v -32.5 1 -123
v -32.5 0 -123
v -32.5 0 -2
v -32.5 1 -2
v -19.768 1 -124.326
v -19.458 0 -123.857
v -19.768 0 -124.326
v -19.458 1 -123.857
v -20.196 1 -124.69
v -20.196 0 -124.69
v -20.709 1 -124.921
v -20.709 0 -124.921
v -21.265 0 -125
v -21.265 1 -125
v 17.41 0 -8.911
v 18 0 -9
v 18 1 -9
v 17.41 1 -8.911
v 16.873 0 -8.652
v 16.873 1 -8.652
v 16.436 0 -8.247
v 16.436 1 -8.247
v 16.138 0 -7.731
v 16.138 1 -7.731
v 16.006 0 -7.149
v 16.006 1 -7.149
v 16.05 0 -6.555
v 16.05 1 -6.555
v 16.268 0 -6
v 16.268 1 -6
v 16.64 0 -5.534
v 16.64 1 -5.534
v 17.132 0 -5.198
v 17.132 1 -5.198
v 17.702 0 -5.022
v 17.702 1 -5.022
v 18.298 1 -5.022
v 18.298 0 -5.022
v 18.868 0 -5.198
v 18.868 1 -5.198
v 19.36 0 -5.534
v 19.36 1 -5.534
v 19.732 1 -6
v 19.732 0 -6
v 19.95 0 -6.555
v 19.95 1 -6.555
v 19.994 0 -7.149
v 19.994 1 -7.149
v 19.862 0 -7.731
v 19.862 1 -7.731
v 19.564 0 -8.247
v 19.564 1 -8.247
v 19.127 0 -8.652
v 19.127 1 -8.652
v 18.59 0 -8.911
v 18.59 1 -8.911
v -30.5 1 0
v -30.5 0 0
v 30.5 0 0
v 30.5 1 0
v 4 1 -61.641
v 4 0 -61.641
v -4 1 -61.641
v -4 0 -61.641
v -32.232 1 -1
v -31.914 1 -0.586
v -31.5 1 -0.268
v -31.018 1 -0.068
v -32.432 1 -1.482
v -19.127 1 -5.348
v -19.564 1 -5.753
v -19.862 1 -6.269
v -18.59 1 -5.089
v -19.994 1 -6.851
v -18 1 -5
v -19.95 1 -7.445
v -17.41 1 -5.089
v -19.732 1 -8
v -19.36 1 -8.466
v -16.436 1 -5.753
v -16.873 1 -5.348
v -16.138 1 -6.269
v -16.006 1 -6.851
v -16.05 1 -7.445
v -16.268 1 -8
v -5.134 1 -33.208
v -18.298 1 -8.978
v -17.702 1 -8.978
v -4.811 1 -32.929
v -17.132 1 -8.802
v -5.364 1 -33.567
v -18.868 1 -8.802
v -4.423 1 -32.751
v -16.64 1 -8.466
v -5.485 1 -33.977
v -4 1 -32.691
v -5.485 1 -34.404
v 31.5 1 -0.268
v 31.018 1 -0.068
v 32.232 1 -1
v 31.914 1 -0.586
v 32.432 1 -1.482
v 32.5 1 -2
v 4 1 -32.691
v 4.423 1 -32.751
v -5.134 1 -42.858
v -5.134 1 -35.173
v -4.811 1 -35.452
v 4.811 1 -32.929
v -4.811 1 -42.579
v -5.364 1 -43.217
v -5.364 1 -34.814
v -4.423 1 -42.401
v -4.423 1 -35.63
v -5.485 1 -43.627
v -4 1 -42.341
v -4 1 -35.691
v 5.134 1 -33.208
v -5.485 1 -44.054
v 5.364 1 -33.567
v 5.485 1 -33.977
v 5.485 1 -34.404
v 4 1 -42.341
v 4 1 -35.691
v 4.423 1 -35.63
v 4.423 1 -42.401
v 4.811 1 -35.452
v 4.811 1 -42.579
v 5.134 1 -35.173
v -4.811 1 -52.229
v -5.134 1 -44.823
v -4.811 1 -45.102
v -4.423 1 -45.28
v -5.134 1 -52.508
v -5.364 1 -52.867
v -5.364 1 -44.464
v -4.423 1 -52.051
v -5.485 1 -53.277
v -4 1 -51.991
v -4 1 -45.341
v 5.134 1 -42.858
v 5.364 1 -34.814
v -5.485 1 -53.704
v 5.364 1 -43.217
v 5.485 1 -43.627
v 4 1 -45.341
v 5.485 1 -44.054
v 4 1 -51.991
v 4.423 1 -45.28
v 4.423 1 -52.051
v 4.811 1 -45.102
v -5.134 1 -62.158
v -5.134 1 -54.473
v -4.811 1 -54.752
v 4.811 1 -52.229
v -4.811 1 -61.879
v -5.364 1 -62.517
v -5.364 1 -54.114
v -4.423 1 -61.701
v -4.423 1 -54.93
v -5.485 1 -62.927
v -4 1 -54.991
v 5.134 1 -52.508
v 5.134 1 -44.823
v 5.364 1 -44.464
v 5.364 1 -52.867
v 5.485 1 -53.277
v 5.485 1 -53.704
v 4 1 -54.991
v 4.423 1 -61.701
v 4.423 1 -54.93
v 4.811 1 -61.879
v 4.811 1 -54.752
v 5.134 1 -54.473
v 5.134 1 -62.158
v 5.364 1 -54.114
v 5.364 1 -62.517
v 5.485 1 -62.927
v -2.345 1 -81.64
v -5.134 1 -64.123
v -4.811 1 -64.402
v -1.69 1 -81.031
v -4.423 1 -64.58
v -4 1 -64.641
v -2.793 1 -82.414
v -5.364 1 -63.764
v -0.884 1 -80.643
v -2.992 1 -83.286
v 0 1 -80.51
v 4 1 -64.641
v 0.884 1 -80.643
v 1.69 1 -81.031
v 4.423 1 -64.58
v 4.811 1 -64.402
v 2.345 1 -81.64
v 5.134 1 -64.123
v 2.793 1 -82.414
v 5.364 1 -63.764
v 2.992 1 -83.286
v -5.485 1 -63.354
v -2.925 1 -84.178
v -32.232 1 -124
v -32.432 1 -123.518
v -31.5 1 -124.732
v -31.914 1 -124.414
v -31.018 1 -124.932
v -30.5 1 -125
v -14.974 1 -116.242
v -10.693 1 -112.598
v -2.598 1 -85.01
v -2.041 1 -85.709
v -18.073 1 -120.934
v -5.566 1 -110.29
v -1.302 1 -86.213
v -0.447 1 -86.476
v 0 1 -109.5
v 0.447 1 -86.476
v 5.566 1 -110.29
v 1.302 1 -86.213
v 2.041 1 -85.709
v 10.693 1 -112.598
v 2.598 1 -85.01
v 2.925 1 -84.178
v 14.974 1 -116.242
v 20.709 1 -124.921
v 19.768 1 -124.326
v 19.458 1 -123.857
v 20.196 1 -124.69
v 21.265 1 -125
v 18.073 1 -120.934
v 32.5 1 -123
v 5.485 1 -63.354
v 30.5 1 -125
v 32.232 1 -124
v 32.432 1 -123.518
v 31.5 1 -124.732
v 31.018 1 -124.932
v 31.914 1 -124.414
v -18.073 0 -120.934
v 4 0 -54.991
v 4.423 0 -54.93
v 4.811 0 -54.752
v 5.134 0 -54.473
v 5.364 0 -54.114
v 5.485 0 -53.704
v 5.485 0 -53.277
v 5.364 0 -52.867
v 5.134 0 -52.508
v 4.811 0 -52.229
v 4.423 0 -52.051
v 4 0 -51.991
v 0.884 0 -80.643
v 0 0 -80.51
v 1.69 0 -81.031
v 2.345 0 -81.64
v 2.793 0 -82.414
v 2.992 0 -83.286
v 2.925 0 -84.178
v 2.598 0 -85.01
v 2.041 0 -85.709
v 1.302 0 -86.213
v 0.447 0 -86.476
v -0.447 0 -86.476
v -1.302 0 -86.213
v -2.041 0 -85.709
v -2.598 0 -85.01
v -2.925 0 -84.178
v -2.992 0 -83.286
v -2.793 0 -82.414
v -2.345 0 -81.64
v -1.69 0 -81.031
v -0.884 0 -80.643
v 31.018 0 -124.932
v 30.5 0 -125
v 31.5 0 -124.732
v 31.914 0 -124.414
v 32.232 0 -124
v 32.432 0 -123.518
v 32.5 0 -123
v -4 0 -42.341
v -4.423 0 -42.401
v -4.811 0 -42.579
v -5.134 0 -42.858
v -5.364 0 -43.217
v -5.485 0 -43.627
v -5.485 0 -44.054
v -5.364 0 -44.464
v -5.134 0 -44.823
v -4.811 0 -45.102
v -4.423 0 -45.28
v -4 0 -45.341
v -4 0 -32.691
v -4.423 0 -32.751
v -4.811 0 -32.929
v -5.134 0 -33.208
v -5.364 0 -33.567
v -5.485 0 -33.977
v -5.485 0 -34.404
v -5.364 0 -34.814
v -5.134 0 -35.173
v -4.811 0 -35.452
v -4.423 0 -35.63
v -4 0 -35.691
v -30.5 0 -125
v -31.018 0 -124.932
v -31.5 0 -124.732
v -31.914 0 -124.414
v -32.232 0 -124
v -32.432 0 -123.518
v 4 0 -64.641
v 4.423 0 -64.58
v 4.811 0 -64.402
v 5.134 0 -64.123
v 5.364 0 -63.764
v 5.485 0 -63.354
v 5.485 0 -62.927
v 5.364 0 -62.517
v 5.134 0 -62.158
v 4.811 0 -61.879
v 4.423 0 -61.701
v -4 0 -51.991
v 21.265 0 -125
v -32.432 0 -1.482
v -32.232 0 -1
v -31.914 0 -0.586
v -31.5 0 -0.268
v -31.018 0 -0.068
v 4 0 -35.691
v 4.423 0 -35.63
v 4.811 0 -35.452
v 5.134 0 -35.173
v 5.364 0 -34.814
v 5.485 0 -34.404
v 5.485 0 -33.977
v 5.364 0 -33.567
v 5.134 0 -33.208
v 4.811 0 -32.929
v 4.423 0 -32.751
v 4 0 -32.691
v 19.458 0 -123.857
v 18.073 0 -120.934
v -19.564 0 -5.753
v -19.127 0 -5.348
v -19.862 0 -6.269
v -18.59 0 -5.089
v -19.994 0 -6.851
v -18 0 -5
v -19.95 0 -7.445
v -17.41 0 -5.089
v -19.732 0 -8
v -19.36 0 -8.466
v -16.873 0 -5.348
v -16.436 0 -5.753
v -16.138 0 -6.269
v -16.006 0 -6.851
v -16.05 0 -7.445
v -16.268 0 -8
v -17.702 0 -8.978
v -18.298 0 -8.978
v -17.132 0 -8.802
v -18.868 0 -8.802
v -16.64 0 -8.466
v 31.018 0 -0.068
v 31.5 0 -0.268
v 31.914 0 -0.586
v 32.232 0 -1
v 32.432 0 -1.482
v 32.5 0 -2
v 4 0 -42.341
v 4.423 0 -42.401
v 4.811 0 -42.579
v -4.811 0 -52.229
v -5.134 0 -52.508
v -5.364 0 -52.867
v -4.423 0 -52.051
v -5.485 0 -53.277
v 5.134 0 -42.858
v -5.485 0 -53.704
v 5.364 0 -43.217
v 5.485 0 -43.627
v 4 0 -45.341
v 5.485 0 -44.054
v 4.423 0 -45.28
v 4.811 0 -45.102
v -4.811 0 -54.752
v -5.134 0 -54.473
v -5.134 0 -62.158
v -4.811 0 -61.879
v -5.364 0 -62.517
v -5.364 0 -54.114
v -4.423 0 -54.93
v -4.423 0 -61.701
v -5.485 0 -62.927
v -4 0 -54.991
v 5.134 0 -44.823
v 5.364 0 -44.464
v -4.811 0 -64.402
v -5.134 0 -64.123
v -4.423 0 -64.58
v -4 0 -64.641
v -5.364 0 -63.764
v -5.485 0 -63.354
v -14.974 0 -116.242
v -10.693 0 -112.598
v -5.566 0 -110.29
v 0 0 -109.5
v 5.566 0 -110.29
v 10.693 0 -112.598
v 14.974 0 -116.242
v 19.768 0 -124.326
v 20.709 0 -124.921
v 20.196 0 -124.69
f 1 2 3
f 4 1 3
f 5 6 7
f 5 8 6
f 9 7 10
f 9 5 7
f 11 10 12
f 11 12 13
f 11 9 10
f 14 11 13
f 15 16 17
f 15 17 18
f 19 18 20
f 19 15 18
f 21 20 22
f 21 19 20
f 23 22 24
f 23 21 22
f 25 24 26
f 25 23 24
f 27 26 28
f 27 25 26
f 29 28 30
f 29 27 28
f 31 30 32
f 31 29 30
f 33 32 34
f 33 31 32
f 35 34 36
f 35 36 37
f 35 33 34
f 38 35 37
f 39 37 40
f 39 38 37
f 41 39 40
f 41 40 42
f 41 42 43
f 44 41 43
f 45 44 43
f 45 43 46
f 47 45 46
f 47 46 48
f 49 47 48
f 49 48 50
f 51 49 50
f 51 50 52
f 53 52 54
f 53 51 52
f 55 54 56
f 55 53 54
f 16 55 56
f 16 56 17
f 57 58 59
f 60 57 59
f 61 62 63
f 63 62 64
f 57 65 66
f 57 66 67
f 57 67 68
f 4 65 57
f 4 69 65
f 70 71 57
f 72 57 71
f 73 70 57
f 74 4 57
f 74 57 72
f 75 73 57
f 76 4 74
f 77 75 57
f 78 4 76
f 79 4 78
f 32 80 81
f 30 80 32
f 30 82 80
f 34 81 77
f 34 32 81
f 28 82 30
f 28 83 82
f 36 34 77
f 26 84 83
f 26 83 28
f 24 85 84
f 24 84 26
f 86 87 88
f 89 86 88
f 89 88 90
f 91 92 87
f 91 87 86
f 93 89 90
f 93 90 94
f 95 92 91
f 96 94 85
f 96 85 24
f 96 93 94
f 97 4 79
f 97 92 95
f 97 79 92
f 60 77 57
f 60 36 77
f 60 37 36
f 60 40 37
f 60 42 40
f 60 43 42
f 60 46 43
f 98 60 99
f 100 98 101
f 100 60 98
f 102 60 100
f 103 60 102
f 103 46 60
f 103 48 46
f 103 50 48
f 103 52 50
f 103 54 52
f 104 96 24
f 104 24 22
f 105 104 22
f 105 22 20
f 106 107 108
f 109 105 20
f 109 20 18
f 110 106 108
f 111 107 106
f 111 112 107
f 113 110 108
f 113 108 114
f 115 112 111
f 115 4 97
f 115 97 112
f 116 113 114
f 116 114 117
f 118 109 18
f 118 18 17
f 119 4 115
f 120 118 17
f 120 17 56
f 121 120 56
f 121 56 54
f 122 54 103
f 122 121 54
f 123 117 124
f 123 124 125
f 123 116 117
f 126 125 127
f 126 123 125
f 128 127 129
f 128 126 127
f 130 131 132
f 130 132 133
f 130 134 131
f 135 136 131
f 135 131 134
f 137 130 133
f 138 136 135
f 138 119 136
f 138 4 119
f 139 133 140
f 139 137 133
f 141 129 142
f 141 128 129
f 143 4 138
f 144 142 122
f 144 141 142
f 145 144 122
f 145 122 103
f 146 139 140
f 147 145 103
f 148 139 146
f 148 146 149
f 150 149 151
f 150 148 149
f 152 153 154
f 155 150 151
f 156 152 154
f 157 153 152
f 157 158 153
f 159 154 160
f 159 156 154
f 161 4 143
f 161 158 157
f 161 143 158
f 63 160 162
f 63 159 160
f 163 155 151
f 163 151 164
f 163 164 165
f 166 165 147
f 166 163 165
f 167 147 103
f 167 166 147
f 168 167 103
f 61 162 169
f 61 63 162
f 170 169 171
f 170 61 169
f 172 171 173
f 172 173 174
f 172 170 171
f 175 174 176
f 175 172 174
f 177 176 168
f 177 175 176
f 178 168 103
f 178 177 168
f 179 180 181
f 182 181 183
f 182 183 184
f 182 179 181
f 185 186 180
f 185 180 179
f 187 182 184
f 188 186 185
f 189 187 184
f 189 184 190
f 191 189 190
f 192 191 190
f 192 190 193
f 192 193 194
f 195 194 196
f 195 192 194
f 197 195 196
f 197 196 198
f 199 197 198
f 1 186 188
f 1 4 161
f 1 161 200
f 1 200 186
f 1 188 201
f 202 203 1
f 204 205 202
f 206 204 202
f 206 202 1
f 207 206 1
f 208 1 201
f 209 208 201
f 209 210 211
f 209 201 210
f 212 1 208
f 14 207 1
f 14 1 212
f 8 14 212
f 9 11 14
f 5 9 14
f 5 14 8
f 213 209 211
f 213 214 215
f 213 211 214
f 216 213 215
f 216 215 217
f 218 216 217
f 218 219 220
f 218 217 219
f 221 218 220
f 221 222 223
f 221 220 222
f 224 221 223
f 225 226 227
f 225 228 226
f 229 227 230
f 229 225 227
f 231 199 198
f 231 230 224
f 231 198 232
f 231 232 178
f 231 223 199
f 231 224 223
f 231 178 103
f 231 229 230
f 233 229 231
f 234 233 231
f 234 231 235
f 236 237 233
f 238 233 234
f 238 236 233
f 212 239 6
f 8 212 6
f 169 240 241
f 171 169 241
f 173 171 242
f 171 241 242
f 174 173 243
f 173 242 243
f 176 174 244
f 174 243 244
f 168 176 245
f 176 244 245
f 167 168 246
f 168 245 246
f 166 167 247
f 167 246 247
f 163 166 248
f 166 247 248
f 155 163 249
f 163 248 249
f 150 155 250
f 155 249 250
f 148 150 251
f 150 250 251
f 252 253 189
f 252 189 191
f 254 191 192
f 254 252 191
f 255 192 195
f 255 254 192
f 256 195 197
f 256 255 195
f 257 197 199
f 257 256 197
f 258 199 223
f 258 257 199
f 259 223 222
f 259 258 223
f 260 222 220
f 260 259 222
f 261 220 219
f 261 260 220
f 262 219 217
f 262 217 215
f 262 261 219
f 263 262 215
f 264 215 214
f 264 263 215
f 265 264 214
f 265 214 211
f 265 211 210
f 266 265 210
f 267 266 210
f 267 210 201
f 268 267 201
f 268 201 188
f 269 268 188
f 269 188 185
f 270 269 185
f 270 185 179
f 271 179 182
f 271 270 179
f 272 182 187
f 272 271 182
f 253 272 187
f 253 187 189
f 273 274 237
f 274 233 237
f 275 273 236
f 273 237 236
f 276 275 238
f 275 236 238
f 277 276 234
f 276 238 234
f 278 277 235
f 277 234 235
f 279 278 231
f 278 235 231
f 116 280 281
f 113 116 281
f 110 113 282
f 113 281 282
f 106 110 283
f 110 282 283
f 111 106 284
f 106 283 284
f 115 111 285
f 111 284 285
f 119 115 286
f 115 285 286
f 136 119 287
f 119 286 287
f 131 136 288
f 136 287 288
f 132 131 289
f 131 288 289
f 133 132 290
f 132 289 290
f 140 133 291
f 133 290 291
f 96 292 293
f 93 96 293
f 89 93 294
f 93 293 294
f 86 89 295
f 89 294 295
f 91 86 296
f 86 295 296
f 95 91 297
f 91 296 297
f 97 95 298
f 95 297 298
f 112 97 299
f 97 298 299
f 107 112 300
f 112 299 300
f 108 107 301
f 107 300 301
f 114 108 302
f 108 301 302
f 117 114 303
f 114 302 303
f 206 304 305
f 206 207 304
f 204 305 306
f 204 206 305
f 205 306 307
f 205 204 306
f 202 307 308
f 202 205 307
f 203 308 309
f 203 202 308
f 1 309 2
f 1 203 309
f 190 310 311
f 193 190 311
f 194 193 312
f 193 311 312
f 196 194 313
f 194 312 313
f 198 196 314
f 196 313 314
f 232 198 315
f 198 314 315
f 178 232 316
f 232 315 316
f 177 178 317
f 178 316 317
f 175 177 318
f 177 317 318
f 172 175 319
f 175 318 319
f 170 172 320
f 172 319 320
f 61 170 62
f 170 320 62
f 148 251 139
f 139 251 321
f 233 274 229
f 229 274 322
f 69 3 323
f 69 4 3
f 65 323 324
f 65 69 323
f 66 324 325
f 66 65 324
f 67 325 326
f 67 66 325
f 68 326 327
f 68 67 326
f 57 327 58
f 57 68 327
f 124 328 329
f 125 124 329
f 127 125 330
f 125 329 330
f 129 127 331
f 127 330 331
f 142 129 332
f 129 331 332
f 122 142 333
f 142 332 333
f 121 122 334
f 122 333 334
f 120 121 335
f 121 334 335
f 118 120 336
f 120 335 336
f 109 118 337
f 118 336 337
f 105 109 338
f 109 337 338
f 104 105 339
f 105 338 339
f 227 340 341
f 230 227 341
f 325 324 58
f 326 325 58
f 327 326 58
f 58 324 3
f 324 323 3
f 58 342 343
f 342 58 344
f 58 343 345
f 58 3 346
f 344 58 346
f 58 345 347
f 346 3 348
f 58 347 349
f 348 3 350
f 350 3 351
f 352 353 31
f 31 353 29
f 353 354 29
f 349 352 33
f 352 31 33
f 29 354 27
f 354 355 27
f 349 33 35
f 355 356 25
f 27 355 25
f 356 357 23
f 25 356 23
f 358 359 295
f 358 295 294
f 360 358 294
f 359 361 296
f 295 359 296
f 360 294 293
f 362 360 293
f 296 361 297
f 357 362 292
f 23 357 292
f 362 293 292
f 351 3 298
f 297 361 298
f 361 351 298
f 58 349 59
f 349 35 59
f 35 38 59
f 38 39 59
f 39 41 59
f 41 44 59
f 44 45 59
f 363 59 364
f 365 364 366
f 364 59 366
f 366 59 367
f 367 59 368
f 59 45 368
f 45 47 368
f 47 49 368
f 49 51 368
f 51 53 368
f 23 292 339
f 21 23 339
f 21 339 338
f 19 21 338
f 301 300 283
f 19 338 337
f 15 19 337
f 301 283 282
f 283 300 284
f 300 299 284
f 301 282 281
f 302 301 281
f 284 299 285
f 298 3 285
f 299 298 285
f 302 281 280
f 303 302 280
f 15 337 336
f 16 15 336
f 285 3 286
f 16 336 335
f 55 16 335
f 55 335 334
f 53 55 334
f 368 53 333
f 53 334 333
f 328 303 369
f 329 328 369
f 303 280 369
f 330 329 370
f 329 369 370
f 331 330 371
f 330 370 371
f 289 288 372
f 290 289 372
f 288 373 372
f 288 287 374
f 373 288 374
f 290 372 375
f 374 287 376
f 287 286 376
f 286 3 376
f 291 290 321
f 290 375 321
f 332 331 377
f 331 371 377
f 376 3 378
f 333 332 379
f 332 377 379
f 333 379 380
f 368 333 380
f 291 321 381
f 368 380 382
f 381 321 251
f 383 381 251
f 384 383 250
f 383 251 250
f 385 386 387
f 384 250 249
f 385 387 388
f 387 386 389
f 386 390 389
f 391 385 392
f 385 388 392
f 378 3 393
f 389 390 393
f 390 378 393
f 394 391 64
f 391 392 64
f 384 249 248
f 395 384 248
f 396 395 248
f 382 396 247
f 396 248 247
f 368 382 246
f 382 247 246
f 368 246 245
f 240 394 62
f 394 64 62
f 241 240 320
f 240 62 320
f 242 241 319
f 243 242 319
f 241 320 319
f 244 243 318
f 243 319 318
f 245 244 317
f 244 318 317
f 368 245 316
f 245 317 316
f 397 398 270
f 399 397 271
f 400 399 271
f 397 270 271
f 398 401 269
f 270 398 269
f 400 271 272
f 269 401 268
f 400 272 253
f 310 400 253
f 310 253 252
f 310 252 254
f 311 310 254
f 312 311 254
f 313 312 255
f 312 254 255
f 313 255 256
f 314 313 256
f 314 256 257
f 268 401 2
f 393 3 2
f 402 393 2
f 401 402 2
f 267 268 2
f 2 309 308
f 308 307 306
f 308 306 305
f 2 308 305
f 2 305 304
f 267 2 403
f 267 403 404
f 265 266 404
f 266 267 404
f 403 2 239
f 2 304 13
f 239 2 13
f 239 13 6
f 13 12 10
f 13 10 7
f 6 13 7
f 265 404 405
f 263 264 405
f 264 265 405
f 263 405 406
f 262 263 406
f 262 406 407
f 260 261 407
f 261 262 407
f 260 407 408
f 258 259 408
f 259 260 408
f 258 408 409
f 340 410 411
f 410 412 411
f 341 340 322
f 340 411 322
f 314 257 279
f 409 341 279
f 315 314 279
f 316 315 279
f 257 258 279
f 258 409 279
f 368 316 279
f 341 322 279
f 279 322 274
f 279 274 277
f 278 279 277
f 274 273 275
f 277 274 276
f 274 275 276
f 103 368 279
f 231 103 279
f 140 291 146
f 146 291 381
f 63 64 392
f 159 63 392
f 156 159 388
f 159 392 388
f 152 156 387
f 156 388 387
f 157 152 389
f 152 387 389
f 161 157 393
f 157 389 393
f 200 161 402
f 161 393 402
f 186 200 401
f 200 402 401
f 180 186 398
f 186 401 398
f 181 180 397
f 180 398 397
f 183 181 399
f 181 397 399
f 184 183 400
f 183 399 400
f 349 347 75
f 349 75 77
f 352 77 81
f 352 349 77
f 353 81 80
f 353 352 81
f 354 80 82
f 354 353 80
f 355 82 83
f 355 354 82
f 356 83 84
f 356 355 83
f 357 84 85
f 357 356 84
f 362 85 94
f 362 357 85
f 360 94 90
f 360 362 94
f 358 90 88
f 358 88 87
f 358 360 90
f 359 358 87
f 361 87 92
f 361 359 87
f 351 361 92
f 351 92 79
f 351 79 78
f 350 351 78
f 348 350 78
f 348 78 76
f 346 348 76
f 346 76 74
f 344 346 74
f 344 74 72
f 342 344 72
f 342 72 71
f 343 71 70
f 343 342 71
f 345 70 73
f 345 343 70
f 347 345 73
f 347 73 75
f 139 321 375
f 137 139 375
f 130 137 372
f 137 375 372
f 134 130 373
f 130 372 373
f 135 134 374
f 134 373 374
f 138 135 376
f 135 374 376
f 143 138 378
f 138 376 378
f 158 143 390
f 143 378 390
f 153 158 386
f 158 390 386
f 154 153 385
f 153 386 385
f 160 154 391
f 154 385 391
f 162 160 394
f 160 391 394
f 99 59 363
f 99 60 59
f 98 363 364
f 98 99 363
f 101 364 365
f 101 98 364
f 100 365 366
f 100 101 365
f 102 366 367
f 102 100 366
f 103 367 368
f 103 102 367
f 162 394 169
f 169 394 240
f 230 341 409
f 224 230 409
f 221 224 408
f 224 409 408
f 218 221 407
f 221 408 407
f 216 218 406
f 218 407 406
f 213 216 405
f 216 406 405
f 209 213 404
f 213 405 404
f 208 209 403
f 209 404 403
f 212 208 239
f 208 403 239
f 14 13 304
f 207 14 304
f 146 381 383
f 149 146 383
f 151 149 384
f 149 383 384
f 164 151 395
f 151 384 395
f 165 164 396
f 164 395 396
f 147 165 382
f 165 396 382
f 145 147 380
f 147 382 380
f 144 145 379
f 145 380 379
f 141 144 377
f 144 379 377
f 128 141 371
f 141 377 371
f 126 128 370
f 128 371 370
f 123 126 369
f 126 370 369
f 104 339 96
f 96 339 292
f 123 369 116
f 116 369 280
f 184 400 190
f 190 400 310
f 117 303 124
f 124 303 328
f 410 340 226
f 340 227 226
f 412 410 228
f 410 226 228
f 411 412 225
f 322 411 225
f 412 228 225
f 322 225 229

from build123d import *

# Parameters (mm, degrees)
SKETCH_1_R      = 2
SKETCH_1_R_2    = 3
EXTRUDE_1_DEPTH = 1
FILLET_1_R      = 2


with BuildPart() as part:
    # 草图1 → Extrude 1 (new body)
    with BuildSketch(Plane(origin=(0, 0, 0), x_dir=(1, 0, 0), z_dir=(0, 1, 0))):
        with BuildLine():
            Line((-18.072575848, 120.933670434), (-20, 125))
            Line((-20, 125), (-32.5, 125))
            Line((-32.5, 125), (-32.5, 0))
            Line((-32.5, 0), (32.5, 0))
            Line((32.5, 0), (32.5, 125))
            Line((32.5, 125), (20, 125))
            Line((20, 125), (18.072575848, 120.933670434))
            ThreePointArc((18.072575848, 120.933670434), (0, 109.5), (-18.072575848, 120.933670434))
        make_face()
        with Locations((-18, 7)):
            Circle(SKETCH_1_R, mode=Mode.SUBTRACT)
        with Locations((18, 7)):
            Circle(SKETCH_1_R, mode=Mode.SUBTRACT)
        with Locations((0, 83.51)):
            Circle(SKETCH_1_R_2, mode=Mode.SUBTRACT)
        with BuildLine():
            Line((-4, 35.690566512), (4, 35.690566512))
            ThreePointArc((4, 35.690566512), (5.5, 34.190566512), (4, 32.690566512))
            Line((4, 32.690566512), (-4, 32.690566512))
            ThreePointArc((-4, 32.690566512), (-5.5, 34.190566512), (-4, 35.690566512))
        make_face(mode=Mode.SUBTRACT)
        with BuildLine():
            Line((-4, 45.340566355), (4, 45.340566355))
            ThreePointArc((4, 45.340566355), (5.5, 43.840566355), (4, 42.340566355))
            Line((4, 42.340566355), (-4, 42.340566355))
            ThreePointArc((-4, 42.340566355), (-5.5, 43.840566355), (-4, 45.340566355))
        make_face(mode=Mode.SUBTRACT)
        with BuildLine():
            Line((-4, 54.990566199), (4, 54.990566199))
            ThreePointArc((4, 54.990566199), (5.5, 53.490566199), (4, 51.990566199))
            Line((4, 51.990566199), (-4, 51.990566199))
            ThreePointArc((-4, 51.990566199), (-5.5, 53.490566199), (-4, 54.990566199))
        make_face(mode=Mode.SUBTRACT)
        with BuildLine():
            Line((-4, 64.640566042), (4, 64.640566042))
            ThreePointArc((4, 64.640566042), (5.5, 63.140566042), (4, 61.640566042))
            Line((4, 61.640566042), (-4, 61.640566042))
            ThreePointArc((-4, 61.640566042), (-5.5, 63.140566042), (-4, 64.640566042))
        make_face(mode=Mode.SUBTRACT)
    extrude(amount=EXTRUDE_1_DEPTH)

    # 圆角1
    fillet_1_edges = [part.edges().sort_by_distance(p)[0] for p in [
        (20, 0.5, -125),
        (32.5, 0.5, -125),
        (-20, 0.5, -125),
        (-32.5, 0.5, 0),
        (-32.5, 0.5, -125),
        (32.5, 0.5, 0),
    ]]
    fillet(fillet_1_edges, radius=FILLET_1_R)


solid = part.part
